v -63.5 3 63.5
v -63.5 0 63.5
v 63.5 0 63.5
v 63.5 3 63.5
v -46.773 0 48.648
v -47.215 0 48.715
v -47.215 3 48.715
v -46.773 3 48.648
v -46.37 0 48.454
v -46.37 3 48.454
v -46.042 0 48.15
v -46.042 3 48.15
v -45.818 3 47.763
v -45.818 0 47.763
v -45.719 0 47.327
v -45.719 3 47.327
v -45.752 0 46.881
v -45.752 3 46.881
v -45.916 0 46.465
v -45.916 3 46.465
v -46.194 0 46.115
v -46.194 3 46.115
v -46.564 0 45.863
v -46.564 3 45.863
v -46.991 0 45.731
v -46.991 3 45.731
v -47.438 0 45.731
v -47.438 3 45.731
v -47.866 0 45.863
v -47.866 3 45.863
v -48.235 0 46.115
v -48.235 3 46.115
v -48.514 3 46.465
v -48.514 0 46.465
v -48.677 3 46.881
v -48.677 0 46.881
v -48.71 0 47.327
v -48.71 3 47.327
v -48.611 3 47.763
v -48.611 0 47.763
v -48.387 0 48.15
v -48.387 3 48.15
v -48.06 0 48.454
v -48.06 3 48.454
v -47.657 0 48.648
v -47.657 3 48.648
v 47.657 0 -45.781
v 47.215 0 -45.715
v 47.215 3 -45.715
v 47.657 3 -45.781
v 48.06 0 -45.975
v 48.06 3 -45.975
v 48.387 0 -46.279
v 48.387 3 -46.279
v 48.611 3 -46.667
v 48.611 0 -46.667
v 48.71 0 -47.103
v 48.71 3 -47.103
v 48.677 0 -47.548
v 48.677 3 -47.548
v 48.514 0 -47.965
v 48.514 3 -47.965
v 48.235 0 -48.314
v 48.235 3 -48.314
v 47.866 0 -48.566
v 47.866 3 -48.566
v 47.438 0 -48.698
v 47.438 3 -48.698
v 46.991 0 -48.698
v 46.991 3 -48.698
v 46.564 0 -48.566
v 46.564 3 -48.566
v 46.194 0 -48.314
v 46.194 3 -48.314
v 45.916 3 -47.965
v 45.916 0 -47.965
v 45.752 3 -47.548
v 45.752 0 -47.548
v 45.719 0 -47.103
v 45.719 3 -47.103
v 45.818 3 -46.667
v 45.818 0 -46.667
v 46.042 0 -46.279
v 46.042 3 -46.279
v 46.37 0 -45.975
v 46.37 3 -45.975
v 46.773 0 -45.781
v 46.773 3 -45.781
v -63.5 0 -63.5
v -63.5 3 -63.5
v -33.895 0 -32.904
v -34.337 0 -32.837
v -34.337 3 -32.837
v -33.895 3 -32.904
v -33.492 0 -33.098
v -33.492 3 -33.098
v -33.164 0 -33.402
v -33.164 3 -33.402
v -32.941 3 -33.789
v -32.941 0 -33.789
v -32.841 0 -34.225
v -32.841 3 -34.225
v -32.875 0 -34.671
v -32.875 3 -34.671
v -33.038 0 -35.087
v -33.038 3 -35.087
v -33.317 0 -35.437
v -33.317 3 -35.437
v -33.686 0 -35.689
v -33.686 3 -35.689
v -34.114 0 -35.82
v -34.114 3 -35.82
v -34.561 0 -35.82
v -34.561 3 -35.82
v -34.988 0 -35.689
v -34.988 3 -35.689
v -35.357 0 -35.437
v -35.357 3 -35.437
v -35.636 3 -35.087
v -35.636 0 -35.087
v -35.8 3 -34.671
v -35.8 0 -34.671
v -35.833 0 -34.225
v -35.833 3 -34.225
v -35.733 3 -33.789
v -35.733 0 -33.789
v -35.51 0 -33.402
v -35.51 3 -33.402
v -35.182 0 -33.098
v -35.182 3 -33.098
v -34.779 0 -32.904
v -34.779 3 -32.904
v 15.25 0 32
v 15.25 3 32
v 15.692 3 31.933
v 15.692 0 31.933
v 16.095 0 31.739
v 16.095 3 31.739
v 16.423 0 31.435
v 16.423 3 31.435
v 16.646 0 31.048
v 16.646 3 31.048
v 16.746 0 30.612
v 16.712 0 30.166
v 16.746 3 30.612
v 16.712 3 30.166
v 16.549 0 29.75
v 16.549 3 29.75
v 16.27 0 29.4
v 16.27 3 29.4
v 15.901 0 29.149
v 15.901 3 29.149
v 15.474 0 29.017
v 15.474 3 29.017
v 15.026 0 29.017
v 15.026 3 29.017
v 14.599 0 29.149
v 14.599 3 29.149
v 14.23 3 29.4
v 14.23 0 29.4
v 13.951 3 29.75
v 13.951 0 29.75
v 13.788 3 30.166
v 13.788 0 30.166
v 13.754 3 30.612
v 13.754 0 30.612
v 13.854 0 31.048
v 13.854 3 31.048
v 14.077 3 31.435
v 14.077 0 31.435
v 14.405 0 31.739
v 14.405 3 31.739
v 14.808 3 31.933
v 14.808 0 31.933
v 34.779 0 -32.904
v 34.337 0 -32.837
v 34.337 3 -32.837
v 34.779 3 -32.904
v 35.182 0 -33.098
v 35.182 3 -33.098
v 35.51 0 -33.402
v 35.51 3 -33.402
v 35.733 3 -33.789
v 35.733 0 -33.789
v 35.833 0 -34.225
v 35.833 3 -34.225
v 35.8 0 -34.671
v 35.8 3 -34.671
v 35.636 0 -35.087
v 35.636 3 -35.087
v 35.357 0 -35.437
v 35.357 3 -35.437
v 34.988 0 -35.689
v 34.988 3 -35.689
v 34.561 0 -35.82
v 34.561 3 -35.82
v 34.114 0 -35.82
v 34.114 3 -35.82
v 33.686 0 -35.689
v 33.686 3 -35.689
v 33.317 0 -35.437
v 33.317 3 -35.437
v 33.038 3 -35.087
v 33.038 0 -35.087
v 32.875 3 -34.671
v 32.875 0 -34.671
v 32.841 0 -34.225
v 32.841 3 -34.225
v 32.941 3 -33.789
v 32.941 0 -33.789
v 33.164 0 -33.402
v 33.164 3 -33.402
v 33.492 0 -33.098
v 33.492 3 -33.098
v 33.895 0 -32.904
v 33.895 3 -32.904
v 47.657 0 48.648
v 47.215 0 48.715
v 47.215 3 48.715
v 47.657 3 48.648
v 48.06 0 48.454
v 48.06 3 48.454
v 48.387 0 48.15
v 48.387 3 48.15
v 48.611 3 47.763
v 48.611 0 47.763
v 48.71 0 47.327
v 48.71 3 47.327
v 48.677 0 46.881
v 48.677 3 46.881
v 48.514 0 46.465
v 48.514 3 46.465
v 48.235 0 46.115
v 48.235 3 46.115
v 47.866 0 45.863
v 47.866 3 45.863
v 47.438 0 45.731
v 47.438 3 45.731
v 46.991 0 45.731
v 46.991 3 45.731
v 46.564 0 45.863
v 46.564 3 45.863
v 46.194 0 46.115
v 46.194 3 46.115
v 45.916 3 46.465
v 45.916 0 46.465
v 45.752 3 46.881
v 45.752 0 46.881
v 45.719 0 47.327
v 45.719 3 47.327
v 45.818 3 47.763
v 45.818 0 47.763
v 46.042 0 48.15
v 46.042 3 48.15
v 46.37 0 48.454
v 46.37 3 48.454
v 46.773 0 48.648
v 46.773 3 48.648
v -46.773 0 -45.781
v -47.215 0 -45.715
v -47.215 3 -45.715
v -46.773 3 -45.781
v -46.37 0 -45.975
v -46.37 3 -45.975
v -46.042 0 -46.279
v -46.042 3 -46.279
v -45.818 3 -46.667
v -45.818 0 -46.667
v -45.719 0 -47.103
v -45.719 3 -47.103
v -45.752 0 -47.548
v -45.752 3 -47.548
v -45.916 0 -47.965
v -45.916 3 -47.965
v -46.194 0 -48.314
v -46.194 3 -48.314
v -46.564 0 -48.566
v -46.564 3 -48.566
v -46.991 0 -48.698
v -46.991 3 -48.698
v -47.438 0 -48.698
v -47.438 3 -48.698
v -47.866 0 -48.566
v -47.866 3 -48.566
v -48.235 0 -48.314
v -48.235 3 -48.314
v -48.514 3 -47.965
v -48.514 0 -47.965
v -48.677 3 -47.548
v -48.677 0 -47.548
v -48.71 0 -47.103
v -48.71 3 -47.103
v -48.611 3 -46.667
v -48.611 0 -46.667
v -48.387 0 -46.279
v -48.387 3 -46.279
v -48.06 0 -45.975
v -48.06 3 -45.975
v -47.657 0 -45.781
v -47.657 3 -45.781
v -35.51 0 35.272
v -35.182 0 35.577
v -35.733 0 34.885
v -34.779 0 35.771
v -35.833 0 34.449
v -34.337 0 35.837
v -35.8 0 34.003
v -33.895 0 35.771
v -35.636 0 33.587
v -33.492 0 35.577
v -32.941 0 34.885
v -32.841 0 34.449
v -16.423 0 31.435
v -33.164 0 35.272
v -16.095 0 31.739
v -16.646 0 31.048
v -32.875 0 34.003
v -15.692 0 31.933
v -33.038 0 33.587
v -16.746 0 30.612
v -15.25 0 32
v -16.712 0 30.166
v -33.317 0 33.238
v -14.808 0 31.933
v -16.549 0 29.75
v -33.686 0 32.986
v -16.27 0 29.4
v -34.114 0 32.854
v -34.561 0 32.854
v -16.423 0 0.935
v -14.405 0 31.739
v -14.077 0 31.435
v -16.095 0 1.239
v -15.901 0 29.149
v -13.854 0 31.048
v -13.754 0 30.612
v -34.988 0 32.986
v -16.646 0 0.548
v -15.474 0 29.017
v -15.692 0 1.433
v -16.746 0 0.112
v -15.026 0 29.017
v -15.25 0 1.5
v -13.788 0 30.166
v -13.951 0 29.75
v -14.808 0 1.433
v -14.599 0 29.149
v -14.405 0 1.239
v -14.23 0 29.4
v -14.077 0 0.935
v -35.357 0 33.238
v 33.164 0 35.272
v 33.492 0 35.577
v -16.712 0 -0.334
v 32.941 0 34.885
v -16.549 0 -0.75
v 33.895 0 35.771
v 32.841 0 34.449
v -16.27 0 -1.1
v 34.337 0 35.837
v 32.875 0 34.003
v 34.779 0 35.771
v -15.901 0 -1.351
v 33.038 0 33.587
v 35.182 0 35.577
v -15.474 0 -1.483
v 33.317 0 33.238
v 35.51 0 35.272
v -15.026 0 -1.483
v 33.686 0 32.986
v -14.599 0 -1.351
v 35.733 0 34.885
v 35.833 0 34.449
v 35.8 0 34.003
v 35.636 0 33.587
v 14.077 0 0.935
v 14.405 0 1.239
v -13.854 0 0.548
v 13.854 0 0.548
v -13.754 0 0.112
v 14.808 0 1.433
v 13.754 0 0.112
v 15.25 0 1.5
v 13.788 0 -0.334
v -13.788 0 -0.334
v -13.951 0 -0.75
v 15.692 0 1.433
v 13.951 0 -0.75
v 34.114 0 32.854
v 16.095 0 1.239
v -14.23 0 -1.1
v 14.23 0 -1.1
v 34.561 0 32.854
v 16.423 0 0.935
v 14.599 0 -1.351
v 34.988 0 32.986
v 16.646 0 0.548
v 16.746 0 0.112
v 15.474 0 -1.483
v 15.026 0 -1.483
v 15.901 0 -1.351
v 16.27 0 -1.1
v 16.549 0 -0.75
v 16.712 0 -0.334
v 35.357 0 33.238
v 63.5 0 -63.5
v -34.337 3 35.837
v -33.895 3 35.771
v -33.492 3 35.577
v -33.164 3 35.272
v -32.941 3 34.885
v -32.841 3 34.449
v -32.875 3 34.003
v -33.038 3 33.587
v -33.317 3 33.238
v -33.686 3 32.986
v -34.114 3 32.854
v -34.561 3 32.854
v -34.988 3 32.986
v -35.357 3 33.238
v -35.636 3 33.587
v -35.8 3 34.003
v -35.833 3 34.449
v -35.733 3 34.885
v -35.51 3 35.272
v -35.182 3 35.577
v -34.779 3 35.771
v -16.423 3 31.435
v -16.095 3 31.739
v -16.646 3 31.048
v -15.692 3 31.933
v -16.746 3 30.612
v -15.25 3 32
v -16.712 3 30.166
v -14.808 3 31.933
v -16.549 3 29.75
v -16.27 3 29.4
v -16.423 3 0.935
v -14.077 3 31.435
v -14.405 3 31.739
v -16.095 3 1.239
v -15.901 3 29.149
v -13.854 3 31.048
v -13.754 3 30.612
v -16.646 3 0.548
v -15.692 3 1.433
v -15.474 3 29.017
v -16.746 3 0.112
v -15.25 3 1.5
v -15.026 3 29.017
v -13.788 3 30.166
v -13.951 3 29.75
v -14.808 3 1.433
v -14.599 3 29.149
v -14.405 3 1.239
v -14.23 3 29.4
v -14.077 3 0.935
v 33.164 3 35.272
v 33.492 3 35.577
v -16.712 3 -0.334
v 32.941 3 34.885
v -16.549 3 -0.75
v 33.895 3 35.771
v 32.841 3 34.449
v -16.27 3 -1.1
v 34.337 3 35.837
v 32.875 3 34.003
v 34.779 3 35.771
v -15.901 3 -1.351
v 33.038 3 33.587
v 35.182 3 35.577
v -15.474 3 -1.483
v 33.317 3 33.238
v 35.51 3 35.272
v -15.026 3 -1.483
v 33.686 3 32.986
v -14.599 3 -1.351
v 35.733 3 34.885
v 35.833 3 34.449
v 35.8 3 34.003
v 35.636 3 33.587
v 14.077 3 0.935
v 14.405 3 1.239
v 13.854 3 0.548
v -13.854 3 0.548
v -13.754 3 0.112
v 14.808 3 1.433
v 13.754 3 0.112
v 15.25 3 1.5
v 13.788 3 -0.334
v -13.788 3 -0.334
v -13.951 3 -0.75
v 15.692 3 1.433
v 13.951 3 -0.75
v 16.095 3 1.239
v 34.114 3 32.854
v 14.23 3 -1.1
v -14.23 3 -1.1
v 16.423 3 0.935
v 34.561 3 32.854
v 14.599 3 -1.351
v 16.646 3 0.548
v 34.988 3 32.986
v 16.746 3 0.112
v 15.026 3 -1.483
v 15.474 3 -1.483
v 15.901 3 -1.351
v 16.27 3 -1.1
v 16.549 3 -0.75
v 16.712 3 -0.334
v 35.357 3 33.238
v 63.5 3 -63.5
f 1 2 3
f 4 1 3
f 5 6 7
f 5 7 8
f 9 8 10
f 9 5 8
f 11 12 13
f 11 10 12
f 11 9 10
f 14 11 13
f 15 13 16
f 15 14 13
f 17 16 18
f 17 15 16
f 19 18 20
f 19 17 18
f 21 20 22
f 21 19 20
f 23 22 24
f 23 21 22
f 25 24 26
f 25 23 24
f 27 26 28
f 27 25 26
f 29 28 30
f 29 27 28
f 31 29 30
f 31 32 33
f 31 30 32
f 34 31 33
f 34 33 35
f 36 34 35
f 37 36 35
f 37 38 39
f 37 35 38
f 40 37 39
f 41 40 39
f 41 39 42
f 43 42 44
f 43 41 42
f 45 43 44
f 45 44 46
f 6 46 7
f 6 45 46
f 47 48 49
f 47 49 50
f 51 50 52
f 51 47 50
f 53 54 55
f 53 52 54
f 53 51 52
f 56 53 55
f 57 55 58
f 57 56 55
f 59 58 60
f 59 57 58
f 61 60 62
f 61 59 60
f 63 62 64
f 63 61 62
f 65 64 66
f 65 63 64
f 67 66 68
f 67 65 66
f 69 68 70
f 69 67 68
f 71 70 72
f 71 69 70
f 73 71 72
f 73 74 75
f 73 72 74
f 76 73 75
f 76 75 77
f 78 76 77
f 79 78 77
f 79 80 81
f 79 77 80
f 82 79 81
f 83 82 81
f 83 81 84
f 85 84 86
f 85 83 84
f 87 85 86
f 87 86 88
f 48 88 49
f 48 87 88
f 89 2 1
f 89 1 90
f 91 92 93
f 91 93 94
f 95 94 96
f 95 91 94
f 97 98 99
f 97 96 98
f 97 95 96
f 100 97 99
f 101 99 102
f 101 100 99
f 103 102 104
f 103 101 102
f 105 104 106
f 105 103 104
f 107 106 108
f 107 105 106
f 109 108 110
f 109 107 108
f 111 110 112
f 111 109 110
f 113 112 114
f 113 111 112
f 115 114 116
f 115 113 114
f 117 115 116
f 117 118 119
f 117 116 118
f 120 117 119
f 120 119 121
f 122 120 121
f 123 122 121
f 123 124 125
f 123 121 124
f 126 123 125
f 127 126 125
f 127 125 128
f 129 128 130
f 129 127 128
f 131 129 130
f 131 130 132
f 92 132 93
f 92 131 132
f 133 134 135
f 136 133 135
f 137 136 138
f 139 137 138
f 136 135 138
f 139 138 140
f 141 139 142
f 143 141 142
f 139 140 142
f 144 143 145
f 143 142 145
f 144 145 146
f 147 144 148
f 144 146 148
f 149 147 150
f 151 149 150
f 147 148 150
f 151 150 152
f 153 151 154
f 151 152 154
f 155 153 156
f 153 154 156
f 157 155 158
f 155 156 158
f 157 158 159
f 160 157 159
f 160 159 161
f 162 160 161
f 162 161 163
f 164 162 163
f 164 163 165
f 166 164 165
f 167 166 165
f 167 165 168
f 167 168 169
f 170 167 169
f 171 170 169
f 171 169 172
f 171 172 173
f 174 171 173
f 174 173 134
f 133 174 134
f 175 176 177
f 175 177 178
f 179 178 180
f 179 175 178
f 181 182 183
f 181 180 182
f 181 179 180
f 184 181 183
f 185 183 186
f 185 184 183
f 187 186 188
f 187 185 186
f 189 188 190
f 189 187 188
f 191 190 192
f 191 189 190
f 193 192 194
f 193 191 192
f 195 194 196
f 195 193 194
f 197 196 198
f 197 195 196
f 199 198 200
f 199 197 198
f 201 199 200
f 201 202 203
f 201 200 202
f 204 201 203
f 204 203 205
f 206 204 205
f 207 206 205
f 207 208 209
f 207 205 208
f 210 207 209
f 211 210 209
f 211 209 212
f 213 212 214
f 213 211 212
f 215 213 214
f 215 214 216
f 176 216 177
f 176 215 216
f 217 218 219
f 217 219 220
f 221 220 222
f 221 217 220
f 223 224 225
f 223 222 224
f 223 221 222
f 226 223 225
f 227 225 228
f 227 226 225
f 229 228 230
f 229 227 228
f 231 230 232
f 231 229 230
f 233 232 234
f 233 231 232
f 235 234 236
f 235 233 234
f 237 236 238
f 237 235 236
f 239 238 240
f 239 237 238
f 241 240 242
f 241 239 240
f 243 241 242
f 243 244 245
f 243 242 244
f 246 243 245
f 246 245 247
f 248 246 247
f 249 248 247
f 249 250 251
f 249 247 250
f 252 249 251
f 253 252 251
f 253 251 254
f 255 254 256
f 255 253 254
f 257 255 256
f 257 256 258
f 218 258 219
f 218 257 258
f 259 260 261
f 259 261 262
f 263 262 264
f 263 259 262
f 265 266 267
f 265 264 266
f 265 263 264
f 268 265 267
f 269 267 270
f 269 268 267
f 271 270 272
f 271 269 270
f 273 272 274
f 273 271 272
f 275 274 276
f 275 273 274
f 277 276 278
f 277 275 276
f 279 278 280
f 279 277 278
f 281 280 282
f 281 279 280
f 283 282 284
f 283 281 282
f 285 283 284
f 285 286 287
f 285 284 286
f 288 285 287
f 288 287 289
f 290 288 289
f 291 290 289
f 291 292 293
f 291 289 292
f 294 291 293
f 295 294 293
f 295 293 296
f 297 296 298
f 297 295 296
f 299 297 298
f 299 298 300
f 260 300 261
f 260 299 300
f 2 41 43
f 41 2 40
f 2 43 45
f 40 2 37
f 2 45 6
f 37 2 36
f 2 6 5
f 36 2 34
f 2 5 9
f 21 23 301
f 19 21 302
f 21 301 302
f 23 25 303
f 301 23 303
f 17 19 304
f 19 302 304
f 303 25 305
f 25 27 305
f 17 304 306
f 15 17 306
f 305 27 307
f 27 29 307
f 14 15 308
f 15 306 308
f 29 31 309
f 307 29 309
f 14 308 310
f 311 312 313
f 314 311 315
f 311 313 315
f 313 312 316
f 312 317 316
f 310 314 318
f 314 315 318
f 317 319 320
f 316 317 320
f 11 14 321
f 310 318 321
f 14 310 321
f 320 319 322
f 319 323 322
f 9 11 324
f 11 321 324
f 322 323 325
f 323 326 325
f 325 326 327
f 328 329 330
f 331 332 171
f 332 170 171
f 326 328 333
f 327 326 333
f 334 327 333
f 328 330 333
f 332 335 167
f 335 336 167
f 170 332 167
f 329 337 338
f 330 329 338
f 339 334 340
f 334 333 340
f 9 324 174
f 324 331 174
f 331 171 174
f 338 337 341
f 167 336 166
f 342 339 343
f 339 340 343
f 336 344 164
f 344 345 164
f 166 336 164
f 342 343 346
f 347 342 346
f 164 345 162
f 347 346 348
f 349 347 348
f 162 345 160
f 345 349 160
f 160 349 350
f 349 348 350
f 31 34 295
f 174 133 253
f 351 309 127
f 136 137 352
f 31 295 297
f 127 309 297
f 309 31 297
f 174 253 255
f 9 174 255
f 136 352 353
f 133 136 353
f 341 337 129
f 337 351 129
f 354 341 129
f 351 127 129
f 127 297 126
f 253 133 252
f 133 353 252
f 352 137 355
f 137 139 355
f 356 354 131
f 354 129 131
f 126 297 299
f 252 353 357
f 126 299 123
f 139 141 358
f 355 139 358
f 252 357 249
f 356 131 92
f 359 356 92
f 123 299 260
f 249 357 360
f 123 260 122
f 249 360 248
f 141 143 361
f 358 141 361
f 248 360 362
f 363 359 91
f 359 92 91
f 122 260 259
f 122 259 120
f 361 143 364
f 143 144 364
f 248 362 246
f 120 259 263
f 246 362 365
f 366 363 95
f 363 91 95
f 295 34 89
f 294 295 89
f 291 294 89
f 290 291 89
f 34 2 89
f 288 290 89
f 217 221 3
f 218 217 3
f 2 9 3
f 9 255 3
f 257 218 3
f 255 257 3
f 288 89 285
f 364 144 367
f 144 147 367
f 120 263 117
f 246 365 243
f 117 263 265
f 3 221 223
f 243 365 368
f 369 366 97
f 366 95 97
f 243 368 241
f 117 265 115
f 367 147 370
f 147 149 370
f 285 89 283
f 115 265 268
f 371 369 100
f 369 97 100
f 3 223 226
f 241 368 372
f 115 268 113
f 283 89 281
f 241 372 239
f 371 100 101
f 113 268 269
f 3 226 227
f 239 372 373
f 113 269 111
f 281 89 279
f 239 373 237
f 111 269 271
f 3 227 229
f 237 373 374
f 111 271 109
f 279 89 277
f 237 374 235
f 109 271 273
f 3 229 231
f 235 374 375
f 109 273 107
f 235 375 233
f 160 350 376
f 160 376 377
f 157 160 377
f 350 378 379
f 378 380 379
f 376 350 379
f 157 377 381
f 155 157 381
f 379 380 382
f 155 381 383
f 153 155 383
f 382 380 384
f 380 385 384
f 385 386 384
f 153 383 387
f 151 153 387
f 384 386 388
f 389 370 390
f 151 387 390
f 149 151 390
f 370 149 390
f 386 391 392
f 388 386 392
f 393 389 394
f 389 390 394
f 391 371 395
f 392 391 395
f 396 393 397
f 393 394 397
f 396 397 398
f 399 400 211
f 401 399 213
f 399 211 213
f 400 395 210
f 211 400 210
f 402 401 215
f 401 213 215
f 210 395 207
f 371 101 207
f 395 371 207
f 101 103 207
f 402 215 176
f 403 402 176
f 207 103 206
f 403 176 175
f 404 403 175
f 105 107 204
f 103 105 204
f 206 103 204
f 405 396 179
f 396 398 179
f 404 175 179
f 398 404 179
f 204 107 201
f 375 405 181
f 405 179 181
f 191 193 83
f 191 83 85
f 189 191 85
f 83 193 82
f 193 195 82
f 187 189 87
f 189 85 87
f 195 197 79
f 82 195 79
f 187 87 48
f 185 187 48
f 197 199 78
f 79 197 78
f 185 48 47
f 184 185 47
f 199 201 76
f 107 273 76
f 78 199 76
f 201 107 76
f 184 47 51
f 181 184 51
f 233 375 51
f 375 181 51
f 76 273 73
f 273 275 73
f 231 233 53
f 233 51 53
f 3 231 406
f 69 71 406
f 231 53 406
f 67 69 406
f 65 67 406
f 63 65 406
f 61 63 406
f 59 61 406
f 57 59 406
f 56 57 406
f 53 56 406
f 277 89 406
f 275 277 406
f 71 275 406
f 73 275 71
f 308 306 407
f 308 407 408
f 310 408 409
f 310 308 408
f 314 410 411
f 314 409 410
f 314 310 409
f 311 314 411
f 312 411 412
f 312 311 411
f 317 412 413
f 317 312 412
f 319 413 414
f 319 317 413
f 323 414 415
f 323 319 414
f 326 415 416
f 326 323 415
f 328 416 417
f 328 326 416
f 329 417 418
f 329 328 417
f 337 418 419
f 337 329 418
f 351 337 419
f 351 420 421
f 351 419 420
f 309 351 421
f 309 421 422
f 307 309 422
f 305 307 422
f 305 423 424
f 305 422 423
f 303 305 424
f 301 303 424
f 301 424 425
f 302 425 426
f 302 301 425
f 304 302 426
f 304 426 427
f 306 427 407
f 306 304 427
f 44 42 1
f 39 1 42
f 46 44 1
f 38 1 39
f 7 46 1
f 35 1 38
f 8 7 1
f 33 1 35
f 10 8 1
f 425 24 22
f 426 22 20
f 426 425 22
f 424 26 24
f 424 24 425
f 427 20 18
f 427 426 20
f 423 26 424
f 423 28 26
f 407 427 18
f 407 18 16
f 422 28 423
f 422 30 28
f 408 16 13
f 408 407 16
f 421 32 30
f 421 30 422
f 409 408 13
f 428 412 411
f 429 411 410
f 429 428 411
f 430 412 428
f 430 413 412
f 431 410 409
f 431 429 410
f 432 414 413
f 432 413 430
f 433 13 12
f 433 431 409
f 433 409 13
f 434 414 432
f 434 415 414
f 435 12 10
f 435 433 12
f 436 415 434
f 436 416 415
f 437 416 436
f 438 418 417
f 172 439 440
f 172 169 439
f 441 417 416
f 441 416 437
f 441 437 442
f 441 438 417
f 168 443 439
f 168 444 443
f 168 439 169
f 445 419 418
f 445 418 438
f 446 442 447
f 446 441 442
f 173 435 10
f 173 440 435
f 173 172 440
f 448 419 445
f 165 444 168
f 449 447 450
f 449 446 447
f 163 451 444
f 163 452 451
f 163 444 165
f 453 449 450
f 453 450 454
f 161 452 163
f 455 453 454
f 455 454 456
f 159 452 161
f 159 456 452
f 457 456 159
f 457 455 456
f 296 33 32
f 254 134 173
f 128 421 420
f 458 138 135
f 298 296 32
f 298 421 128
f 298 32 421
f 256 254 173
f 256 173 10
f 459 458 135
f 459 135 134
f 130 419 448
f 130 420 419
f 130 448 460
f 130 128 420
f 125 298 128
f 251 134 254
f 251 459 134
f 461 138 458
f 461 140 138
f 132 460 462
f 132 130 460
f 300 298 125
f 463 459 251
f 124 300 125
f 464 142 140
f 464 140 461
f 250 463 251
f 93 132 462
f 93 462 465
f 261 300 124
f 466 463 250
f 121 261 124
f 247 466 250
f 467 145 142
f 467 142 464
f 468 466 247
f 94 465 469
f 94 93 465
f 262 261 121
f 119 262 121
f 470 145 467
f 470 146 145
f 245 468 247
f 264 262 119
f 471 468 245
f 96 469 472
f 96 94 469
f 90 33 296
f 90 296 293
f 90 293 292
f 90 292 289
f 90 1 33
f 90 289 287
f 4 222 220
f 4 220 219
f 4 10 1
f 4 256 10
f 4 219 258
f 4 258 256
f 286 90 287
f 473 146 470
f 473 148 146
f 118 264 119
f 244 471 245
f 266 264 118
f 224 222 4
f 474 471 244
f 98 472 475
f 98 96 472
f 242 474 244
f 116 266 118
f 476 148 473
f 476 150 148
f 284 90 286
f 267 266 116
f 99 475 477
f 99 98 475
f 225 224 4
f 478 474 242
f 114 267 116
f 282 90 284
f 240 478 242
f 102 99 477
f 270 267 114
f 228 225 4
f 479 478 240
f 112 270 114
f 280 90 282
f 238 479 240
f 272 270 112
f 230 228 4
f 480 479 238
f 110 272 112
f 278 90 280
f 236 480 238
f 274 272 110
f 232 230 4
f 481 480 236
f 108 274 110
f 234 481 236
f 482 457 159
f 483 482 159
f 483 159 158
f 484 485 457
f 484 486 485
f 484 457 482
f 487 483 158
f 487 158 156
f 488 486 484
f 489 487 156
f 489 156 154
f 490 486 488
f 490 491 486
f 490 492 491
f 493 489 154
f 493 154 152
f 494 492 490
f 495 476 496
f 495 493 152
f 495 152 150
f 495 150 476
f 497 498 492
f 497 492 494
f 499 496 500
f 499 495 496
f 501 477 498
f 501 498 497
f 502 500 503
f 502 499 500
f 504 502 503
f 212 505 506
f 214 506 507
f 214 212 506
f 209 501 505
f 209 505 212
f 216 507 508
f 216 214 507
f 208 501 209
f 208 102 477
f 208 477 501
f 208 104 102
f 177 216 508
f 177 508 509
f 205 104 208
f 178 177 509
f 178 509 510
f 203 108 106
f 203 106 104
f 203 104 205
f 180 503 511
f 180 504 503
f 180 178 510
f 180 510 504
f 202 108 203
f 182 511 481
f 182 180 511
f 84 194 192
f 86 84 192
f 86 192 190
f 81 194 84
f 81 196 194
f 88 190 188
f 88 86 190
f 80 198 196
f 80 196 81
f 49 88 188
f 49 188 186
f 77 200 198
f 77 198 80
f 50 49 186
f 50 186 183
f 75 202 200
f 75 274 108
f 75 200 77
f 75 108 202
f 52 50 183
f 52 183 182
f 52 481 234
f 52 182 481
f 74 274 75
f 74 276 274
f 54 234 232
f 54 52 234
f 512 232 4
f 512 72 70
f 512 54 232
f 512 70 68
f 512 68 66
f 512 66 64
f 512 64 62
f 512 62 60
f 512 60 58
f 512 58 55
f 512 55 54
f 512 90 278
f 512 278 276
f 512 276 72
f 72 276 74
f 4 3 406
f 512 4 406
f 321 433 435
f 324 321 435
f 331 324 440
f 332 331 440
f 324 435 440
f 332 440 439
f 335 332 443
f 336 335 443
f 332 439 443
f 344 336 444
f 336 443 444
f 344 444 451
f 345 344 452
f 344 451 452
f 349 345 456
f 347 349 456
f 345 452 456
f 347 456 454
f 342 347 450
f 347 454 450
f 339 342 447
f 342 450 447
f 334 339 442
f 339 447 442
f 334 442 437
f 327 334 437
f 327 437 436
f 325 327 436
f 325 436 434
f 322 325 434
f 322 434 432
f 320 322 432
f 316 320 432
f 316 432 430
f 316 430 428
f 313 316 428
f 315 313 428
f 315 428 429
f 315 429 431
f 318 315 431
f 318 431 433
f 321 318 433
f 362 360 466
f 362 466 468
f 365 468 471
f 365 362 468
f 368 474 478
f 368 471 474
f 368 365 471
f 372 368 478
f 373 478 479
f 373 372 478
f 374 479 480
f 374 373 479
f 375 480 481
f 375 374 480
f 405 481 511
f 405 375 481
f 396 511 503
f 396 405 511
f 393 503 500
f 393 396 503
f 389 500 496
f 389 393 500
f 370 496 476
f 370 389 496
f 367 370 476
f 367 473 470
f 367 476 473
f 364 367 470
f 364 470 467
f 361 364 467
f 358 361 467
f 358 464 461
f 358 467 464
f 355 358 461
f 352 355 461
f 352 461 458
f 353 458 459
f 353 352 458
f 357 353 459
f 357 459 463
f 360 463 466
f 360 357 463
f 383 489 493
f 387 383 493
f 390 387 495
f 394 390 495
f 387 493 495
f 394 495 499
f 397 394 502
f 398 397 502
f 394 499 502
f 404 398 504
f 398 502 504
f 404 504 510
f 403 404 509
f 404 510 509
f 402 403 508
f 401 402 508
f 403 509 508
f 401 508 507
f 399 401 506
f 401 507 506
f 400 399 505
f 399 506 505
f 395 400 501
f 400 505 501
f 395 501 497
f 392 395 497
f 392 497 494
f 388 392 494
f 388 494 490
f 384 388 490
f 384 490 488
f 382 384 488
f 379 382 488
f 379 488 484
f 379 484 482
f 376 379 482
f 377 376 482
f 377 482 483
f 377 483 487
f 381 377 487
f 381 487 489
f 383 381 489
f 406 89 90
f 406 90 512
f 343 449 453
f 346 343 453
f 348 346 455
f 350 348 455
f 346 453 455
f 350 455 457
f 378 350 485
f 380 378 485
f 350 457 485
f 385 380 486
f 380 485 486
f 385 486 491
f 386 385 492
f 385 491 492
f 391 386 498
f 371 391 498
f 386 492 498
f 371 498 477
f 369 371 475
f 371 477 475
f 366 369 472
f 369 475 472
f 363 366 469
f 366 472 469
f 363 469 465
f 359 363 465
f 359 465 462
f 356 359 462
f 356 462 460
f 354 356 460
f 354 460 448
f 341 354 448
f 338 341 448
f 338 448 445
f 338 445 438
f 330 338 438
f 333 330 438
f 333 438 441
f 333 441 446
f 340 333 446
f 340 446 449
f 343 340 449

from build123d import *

# Parameters (mm, degrees)
SKETCH2_W               = 127
SKETCH2_H               = 127
BOSS_EXTRUDE1_DEPTH     = 3
CUT_EXTRUDE1_DEPTH      = 90.852657167
CUT_EXTRUDE1_DEPTH_BACK = 90.852657167
SKETCH3_R               = 1.5
SKETCH4_R               = 1.5
CUT_EXTRUDE2_DEPTH      = 10


with BuildPart() as part:
    # Sketch2 → Boss-Extrude1 (new body)
    with BuildSketch(Plane(origin=(0, 0, 0), x_dir=(1, 0, 0), z_dir=(0, 1, 0))):
        Rectangle(SKETCH2_W, SKETCH2_H)
    extrude(amount=BOSS_EXTRUDE1_DEPTH)

    # Sketch3 → Cut-Extrude1 (cut, two sides: drawn at the far end of the back side and taken through both)
    with BuildSketch(Plane(origin=(0, 3, 0), x_dir=(1, 0, 0), z_dir=(0, 1, 0)).offset(-CUT_EXTRUDE1_DEPTH_BACK)):
        with Locations(Location((-47.214690182, 47.214690182, 0), (0, 0, 270))):
            Circle(SKETCH3_R)
        with Locations(Location((-34.337144063, 34.337144063, 0), (0, 0, 270))):
            Circle(SKETCH3_R)
        with Locations(Location((47.214690182, 47.214690182, 0), (0, 0, 270))):
            Circle(SKETCH3_R)
        with Locations(Location((34.337144063, 34.337144063, 0), (0, 0, 270))):
            Circle(SKETCH3_R)
        with Locations(Location((47.214690182, -47.214690182, 0), (0, 0, 270))):
            Circle(SKETCH3_R)
        with Locations(Location((34.337144063, -34.337144063, 0), (0, 0, 270))):
            Circle(SKETCH3_R)
        with Locations(Location((-47.214690182, -47.214690182, 0), (0, 0, 270))):
            Circle(SKETCH3_R)
        with Locations(Location((-34.337144063, -34.337144063, 0), (0, 0, 270))):
            Circle(SKETCH3_R)
    extrude(amount=CUT_EXTRUDE1_DEPTH + CUT_EXTRUDE1_DEPTH_BACK, mode=Mode.SUBTRACT)

    # Sketch4 → Cut-Extrude2 (cut)
    with BuildSketch(Plane(origin=(0, 3, 0), x_dir=(1, 0, 0), z_dir=(0, 1, 0))):
        with Locations(Location((-15.25, 0, 0), (0, 0, 270))):
            Circle(SKETCH4_R)
        with Locations(Location((15.25, 0, 0), (0, 0, 270))):
            Circle(SKETCH4_R)
        with Locations(Location((-15.25, -30.5, 0), (0, 0, 270))):
            Circle(SKETCH4_R)
        with Locations(Location((15.25, -30.5, 0), (0, 0, 270))):
            Circle(SKETCH4_R)
    extrude(amount=-CUT_EXTRUDE2_DEPTH, mode=Mode.SUBTRACT)


solid = part.part
